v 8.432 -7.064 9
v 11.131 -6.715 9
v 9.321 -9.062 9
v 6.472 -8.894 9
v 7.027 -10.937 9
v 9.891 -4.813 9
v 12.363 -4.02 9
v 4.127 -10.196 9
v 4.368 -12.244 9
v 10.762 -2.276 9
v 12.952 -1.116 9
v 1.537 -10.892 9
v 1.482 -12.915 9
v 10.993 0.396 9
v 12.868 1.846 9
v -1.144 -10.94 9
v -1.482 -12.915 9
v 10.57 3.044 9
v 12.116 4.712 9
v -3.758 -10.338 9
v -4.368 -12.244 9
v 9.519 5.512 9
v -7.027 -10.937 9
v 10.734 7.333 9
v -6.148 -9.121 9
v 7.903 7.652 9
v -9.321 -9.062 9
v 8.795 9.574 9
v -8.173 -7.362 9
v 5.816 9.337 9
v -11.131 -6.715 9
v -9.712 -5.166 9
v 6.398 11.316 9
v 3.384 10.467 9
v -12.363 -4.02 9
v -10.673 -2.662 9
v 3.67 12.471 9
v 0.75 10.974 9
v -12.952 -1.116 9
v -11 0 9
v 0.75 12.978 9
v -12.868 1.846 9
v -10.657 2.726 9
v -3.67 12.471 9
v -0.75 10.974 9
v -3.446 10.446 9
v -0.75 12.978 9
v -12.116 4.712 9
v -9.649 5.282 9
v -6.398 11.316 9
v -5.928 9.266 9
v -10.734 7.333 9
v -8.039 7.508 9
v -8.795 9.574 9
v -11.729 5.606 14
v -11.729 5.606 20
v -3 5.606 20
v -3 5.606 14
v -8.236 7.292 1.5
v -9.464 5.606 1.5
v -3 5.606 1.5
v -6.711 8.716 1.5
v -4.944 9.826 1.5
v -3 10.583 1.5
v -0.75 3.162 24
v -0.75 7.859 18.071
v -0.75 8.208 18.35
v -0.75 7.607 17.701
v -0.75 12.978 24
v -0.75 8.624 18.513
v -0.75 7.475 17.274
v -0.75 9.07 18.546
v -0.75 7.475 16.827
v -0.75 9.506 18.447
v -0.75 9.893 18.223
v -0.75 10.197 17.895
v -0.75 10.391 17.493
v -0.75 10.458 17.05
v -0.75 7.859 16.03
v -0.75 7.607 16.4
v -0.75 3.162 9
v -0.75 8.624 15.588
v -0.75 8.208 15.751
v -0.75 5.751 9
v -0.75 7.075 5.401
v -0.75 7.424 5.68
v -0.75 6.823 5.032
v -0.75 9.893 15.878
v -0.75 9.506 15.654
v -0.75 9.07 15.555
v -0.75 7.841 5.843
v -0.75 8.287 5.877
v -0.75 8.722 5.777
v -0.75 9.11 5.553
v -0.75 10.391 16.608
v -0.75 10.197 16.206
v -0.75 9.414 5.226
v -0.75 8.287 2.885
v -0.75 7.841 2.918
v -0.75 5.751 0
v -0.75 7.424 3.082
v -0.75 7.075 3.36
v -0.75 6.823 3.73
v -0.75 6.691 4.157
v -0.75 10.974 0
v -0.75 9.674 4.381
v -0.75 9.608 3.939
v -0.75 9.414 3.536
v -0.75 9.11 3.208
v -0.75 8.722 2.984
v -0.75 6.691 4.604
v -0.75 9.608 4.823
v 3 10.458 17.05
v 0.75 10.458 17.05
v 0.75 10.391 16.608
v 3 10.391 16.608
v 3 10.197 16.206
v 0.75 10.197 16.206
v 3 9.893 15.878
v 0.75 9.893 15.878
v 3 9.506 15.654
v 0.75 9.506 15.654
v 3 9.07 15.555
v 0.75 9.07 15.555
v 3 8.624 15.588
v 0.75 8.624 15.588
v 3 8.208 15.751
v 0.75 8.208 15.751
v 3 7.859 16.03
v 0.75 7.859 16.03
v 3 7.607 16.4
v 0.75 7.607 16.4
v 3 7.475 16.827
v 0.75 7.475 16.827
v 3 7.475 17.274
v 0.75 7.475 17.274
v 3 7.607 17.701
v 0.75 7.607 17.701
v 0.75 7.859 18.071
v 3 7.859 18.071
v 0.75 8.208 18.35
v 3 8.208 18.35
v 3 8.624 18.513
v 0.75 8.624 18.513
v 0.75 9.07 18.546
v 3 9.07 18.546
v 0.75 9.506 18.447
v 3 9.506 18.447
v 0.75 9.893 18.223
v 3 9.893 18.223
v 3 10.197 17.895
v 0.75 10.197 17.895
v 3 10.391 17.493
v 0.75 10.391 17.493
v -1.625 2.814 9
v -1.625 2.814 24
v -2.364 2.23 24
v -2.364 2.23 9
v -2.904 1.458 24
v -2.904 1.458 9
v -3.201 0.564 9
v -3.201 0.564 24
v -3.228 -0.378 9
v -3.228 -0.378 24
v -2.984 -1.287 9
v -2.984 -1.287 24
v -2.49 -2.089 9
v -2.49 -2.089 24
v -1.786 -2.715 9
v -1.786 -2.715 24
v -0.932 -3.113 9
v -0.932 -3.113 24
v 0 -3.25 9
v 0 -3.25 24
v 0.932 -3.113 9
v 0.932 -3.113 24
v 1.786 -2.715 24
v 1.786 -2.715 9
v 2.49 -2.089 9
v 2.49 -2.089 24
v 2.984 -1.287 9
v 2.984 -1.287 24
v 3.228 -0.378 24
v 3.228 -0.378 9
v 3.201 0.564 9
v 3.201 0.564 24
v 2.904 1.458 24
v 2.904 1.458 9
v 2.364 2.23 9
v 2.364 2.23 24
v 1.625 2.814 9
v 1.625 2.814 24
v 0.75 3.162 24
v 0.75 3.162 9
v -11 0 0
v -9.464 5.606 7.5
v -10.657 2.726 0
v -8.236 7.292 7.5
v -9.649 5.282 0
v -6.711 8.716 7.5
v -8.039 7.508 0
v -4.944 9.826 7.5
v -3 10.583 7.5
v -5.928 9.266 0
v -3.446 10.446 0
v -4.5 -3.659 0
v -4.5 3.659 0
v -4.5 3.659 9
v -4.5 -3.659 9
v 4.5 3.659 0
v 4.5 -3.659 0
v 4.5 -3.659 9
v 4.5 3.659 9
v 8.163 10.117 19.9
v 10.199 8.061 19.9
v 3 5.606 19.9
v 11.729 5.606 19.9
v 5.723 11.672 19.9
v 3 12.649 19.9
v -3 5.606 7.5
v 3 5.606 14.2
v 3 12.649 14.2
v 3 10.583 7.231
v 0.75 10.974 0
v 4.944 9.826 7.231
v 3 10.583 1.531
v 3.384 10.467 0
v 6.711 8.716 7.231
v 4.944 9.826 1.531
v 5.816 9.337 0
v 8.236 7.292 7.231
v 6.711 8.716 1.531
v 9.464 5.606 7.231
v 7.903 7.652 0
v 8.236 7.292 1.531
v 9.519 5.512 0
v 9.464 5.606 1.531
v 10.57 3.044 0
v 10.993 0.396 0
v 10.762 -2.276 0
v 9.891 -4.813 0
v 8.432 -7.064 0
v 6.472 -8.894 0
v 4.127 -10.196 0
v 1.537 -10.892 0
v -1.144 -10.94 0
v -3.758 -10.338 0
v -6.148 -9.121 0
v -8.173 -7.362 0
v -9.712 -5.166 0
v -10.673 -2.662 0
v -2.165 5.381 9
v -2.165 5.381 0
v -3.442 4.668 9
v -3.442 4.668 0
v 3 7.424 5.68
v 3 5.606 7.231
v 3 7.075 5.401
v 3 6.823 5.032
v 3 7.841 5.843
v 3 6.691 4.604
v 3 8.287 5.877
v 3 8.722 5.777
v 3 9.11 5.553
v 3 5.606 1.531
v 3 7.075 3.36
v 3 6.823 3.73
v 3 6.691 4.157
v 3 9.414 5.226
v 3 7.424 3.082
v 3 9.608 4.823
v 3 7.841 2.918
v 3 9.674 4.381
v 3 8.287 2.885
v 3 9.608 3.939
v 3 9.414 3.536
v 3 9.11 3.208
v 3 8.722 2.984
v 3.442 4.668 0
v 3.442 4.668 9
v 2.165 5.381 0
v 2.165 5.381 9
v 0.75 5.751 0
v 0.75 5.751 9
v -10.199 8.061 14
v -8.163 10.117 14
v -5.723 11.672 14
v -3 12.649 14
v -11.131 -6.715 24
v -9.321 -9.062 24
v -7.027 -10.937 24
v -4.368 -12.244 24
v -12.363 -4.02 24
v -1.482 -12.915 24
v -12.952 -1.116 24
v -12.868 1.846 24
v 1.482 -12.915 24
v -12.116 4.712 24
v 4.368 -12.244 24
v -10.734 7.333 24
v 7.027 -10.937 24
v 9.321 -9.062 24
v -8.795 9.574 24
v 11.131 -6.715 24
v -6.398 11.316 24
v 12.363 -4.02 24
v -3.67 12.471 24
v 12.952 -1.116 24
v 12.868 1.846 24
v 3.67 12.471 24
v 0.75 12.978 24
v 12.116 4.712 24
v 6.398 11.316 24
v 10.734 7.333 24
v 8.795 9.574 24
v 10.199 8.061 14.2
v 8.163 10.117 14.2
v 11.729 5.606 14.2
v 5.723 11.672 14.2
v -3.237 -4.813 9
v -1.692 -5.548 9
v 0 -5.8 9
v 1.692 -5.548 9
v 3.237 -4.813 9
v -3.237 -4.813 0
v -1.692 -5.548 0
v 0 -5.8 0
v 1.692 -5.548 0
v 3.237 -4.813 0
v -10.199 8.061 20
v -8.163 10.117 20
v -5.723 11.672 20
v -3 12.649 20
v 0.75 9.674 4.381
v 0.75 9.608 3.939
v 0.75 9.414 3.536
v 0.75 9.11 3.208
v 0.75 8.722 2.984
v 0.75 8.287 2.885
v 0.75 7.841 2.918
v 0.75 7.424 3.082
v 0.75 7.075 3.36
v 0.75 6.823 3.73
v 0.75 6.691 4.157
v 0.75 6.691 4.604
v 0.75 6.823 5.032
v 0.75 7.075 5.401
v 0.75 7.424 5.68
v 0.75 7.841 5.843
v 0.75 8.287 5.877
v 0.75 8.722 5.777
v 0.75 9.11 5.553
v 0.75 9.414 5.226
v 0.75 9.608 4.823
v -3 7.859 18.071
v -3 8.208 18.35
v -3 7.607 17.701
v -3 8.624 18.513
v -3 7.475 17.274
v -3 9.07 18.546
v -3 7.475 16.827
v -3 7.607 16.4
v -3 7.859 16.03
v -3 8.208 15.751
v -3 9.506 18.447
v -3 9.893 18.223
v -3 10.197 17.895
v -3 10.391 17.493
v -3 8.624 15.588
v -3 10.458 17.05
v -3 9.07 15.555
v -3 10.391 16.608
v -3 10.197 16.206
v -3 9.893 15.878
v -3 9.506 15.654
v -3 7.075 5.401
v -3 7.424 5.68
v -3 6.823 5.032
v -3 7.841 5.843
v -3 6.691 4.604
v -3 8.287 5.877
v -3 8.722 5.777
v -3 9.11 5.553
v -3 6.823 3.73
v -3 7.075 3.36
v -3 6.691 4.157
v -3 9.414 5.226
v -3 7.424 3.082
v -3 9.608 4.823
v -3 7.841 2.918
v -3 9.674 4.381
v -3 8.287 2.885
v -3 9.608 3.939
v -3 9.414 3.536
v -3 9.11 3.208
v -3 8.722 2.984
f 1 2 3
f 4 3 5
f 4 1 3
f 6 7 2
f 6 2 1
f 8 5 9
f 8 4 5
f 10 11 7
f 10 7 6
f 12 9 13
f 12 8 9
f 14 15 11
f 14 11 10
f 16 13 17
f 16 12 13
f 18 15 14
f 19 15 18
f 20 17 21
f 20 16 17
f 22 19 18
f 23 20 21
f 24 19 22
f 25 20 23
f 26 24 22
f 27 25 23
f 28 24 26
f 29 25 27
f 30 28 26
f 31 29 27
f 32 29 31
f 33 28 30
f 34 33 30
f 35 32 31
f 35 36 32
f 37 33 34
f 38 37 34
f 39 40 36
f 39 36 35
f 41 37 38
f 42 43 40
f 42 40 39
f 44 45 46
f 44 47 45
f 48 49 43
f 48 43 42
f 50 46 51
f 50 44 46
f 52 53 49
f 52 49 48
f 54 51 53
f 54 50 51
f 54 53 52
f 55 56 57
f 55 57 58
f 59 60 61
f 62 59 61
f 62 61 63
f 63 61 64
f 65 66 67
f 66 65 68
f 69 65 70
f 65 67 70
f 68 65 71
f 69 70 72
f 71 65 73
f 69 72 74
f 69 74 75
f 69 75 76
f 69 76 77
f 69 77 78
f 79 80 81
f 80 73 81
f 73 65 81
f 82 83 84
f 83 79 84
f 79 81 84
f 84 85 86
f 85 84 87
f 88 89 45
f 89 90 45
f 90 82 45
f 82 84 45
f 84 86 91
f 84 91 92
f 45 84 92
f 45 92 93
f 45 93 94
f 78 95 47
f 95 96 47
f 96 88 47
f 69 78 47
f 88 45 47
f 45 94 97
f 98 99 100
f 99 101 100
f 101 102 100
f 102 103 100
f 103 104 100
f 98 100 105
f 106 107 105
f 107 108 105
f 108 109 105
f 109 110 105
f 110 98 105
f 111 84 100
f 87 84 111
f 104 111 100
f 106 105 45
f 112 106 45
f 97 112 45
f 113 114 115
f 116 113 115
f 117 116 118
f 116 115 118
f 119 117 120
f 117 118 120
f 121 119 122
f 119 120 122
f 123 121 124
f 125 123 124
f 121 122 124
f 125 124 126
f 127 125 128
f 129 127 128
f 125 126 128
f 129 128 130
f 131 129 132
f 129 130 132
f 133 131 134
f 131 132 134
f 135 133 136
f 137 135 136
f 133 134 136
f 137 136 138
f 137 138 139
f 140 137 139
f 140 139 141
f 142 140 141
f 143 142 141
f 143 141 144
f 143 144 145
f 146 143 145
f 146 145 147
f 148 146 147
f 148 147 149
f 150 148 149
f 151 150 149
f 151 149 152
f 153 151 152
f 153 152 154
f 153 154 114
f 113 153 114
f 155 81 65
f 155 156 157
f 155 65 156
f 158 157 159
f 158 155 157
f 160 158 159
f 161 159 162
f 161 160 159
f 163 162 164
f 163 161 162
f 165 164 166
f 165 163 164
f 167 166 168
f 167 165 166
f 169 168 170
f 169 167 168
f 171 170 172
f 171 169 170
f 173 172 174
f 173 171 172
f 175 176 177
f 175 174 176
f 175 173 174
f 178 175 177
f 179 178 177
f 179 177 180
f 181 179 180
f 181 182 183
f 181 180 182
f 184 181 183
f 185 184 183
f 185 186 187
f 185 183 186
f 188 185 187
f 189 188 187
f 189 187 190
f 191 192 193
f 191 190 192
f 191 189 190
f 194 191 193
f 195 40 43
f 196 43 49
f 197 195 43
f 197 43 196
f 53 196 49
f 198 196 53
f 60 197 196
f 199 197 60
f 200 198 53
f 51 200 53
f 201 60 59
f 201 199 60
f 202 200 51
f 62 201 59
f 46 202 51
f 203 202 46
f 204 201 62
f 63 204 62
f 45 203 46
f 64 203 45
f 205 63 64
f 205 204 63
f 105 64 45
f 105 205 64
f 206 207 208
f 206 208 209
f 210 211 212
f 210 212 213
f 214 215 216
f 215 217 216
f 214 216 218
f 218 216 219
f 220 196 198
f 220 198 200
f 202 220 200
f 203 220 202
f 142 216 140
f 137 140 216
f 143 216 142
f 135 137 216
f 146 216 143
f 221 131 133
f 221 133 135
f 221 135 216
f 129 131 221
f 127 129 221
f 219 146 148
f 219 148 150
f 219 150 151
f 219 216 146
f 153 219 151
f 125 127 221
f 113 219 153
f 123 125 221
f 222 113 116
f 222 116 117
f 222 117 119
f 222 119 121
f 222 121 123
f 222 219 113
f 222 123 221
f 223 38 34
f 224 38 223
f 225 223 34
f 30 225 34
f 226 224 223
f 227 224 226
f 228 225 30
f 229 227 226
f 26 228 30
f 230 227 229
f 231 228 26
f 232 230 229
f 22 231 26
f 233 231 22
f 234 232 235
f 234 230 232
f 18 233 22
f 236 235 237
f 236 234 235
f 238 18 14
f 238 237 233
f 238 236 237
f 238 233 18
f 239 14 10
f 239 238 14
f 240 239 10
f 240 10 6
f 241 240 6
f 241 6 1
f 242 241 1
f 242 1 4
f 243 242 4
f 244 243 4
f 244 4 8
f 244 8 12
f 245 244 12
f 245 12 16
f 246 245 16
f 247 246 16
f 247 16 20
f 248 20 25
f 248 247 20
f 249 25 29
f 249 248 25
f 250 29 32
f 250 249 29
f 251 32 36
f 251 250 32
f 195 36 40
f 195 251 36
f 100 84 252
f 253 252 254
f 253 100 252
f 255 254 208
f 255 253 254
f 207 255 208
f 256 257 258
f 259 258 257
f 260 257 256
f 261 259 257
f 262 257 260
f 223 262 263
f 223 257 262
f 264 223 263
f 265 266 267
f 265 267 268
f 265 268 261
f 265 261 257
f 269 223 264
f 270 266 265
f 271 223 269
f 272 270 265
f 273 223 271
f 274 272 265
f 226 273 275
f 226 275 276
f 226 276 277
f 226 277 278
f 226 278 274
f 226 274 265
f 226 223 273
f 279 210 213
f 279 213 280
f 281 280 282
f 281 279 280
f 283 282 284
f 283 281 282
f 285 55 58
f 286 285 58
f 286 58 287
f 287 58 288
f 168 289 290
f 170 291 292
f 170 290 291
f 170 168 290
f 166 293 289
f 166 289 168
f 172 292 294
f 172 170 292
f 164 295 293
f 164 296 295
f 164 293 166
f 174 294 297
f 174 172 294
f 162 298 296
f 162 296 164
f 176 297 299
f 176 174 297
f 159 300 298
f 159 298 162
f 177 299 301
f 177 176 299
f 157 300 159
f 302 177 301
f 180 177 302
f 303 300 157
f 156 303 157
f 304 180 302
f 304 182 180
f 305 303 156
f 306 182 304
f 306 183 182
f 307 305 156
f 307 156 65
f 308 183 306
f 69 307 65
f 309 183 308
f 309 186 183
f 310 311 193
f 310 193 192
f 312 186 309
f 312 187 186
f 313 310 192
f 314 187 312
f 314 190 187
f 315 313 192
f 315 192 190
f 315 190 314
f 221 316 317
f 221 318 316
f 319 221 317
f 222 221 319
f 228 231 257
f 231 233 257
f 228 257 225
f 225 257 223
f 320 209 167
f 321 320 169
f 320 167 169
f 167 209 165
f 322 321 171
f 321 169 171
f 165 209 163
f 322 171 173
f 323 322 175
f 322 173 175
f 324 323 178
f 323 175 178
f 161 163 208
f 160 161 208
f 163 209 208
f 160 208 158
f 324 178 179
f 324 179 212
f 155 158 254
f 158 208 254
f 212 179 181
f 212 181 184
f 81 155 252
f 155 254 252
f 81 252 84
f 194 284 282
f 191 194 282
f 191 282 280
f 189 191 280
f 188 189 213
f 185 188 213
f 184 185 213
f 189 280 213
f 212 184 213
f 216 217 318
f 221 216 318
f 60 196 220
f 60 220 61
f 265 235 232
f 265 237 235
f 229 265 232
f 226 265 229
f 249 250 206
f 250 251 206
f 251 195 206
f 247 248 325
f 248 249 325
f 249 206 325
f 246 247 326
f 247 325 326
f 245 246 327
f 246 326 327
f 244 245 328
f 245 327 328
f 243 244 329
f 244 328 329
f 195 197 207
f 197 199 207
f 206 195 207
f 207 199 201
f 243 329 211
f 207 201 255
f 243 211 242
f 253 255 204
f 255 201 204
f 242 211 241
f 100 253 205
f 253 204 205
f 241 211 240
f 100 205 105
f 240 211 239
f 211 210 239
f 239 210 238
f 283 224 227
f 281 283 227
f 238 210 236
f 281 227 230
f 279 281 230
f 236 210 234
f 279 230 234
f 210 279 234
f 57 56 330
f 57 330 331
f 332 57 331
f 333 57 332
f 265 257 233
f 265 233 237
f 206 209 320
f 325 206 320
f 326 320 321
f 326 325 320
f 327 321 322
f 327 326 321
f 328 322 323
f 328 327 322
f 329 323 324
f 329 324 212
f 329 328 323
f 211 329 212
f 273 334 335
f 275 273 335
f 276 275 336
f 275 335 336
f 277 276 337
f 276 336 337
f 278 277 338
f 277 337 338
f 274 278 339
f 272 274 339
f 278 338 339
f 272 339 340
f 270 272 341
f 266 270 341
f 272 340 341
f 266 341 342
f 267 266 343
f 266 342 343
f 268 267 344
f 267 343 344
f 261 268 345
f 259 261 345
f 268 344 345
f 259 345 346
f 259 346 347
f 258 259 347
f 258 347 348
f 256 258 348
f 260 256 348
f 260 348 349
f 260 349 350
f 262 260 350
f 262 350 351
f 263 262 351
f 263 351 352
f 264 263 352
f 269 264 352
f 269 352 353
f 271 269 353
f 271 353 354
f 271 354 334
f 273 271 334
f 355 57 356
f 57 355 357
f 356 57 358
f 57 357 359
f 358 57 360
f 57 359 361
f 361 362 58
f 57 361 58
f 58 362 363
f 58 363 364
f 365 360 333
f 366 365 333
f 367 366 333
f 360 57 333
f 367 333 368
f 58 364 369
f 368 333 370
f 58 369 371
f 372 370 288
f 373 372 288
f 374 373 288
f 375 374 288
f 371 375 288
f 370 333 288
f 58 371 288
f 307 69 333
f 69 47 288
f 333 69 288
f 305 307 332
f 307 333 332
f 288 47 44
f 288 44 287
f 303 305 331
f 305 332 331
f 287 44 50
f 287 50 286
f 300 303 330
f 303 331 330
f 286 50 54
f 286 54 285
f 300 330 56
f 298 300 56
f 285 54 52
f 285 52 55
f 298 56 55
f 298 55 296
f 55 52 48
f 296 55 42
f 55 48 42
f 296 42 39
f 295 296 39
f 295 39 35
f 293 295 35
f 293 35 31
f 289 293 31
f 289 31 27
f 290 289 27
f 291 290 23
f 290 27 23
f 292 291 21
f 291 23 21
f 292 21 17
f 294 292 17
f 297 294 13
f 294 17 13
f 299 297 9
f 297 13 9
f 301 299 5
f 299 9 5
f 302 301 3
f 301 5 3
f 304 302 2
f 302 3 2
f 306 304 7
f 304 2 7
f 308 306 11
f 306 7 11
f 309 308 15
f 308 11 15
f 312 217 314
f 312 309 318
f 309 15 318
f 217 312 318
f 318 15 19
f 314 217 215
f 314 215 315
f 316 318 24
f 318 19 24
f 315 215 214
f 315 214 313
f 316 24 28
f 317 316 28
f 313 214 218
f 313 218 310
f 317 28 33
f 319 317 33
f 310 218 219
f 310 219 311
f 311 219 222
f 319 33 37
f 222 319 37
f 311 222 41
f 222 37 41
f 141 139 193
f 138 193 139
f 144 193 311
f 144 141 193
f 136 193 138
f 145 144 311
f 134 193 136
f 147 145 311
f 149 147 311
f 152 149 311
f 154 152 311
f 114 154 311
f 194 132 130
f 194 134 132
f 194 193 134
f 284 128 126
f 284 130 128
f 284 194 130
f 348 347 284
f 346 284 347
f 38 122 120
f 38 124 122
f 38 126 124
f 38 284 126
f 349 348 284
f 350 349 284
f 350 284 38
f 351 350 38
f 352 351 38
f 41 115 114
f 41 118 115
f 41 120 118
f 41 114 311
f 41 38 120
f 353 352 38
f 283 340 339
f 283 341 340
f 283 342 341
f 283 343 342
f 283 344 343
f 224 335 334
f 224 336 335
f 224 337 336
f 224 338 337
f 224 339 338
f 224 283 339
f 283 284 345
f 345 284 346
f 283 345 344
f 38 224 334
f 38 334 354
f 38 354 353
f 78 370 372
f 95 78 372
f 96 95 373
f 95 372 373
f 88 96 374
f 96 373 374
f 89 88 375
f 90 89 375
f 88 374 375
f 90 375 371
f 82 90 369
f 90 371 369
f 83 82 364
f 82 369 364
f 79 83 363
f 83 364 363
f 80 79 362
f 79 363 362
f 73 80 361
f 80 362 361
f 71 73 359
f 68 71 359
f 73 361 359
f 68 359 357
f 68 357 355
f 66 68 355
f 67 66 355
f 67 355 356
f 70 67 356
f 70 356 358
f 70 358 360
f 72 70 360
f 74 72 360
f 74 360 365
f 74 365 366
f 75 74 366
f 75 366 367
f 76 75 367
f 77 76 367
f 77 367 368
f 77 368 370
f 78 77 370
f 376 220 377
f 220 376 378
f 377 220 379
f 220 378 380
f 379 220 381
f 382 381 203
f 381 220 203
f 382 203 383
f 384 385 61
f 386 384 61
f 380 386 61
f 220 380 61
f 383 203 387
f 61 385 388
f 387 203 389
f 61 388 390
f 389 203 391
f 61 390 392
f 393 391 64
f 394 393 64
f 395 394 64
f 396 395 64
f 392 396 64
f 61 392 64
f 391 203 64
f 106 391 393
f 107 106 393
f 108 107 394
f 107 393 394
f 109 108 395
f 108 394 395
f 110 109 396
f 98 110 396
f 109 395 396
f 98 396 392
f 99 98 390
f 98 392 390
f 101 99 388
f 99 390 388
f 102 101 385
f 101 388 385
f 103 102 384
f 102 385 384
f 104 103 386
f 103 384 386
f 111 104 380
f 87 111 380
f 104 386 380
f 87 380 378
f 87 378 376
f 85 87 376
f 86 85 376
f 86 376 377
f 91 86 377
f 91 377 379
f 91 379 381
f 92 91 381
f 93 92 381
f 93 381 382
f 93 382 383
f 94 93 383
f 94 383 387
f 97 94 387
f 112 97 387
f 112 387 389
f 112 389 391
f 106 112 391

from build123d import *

# Parameters (mm, degrees)
SKETCH_1_R           = 13
EXTRUDE_1_DEPTH      = 9
SKETCH_2_R           = 13
SKETCH_2_R_2         = 3.25
EXTRUDE_2_DEPTH      = 15
SKETCH_3_W           = 1.5
SKETCH_3_H           = 11.626426752
CUT_EXTRUDE_3_DEPTH  = 31.232432916
SKETCH_7_R           = 16.638234873
SKETCH_7_R_2         = 11
CUT_EXTRUDE_9_DEPTH  = 9
CUTOFF_START         = -3
SKETCH_8_W           = 6
SKETCH_8_H           = 5.368740975
SKETCH_8_H_2         = 7.372686293
CUTOFF_DEPTH         = 20
SKETCH_10_R          = 1.5
CUT_EXTRUDE_12_DEPTH = 32.638584039
CUT_EXTRUDE_START    = 3
SKETCH_9_W           = 5.7
SKETCH_9_H           = 7.372686293
SKETCH_9_H_2         = 5.368740975
CUT_EXTRUDE_11_DEPTH = 20


with BuildPart() as part:
    # Эскиз1 → Вытянуть1 (new body)
    with BuildSketch(Plane.XY):
        Circle(SKETCH_1_R)
        with BuildLine():
            Line((-4.5, 3.659234893), (-4.5, -3.659234893))
            ThreePointArc((-4.5, -3.659234893), (0, -5.8), (4.5, -3.659234893))
            Line((4.5, -3.659234893), (4.5, 3.659234893))
            ThreePointArc((4.5, 3.659234893), (0, 5.8), (-4.5, 3.659234893))
        make_face(mode=Mode.SUBTRACT)
    extrude(amount=EXTRUDE_1_DEPTH)

    # Эскиз2 → Вытянуть2 (add)
    with BuildSketch(Plane.XY.offset(9)):
        Circle(SKETCH_2_R)
        Circle(SKETCH_2_R_2, mode=Mode.SUBTRACT)
    extrude(amount=EXTRUDE_2_DEPTH)

    # Эскиз3 → Вытянуть3 (cut, through all)
    with BuildSketch(Plane(origin=(0, 0, 0), x_dir=(-1, 0, 0), z_dir=(0, 0, -1))):
        with Locations((0, 7.379803008)):
            Rectangle(SKETCH_3_W, SKETCH_3_H)
    extrude(amount=-CUT_EXTRUDE_3_DEPTH, mode=Mode.SUBTRACT)

    # Эскиз7 → Вытянуть9 (cut)
    with BuildSketch(Plane(origin=(0, 0, 0), x_dir=(-1, 0, 0), z_dir=(0, 0, -1))):
        Circle(SKETCH_7_R)
        Circle(SKETCH_7_R_2, mode=Mode.SUBTRACT)
    extrude(amount=-CUT_EXTRUDE_9_DEPTH, mode=Mode.SUBTRACT)

    # Эскиз8 → cutoff (cut)
    with BuildSketch(Plane(origin=(0, 0, 0), x_dir=(0, 0, -1), z_dir=(1, 0, 0)).offset(CUTOFF_START)):
        with Locations((-4.5, 8.290031546)):
            Rectangle(SKETCH_8_W, SKETCH_8_H)
        with Locations((-17, 9.292004205)):
            Rectangle(SKETCH_8_W, SKETCH_8_H_2)
    extrude(amount=-CUTOFF_DEPTH, mode=Mode.SUBTRACT)

    # Эскиз10 → Вытянуть12 (cut, through all)
    with BuildSketch(Plane.ZY.offset(3)):
        with Locations(Location((4.38073417, 8.174442111, 0), (0, 0, 90))):
            Circle(SKETCH_10_R)
        with Locations(Location((17.050484779, 8.958138025, 0), (0, 0, 90))):
            Circle(SKETCH_10_R)
    extrude(amount=-CUT_EXTRUDE_12_DEPTH, mode=Mode.SUBTRACT)

    # Эскиз9 → Вытянуть11 (cut)
    with BuildSketch(Plane(origin=(0, 0, 0), x_dir=(0, 0, -1), z_dir=(1, 0, 0)).offset(CUT_EXTRUDE_START)):
        with Locations((-17.050484779, 9.292004205)):
            Rectangle(SKETCH_9_W, SKETCH_9_H)
        with Locations((-4.38073417, 8.290031546)):
            Rectangle(SKETCH_9_W, SKETCH_9_H_2)
    extrude(amount=CUT_EXTRUDE_11_DEPTH, mode=Mode.SUBTRACT)


solid = part.part
